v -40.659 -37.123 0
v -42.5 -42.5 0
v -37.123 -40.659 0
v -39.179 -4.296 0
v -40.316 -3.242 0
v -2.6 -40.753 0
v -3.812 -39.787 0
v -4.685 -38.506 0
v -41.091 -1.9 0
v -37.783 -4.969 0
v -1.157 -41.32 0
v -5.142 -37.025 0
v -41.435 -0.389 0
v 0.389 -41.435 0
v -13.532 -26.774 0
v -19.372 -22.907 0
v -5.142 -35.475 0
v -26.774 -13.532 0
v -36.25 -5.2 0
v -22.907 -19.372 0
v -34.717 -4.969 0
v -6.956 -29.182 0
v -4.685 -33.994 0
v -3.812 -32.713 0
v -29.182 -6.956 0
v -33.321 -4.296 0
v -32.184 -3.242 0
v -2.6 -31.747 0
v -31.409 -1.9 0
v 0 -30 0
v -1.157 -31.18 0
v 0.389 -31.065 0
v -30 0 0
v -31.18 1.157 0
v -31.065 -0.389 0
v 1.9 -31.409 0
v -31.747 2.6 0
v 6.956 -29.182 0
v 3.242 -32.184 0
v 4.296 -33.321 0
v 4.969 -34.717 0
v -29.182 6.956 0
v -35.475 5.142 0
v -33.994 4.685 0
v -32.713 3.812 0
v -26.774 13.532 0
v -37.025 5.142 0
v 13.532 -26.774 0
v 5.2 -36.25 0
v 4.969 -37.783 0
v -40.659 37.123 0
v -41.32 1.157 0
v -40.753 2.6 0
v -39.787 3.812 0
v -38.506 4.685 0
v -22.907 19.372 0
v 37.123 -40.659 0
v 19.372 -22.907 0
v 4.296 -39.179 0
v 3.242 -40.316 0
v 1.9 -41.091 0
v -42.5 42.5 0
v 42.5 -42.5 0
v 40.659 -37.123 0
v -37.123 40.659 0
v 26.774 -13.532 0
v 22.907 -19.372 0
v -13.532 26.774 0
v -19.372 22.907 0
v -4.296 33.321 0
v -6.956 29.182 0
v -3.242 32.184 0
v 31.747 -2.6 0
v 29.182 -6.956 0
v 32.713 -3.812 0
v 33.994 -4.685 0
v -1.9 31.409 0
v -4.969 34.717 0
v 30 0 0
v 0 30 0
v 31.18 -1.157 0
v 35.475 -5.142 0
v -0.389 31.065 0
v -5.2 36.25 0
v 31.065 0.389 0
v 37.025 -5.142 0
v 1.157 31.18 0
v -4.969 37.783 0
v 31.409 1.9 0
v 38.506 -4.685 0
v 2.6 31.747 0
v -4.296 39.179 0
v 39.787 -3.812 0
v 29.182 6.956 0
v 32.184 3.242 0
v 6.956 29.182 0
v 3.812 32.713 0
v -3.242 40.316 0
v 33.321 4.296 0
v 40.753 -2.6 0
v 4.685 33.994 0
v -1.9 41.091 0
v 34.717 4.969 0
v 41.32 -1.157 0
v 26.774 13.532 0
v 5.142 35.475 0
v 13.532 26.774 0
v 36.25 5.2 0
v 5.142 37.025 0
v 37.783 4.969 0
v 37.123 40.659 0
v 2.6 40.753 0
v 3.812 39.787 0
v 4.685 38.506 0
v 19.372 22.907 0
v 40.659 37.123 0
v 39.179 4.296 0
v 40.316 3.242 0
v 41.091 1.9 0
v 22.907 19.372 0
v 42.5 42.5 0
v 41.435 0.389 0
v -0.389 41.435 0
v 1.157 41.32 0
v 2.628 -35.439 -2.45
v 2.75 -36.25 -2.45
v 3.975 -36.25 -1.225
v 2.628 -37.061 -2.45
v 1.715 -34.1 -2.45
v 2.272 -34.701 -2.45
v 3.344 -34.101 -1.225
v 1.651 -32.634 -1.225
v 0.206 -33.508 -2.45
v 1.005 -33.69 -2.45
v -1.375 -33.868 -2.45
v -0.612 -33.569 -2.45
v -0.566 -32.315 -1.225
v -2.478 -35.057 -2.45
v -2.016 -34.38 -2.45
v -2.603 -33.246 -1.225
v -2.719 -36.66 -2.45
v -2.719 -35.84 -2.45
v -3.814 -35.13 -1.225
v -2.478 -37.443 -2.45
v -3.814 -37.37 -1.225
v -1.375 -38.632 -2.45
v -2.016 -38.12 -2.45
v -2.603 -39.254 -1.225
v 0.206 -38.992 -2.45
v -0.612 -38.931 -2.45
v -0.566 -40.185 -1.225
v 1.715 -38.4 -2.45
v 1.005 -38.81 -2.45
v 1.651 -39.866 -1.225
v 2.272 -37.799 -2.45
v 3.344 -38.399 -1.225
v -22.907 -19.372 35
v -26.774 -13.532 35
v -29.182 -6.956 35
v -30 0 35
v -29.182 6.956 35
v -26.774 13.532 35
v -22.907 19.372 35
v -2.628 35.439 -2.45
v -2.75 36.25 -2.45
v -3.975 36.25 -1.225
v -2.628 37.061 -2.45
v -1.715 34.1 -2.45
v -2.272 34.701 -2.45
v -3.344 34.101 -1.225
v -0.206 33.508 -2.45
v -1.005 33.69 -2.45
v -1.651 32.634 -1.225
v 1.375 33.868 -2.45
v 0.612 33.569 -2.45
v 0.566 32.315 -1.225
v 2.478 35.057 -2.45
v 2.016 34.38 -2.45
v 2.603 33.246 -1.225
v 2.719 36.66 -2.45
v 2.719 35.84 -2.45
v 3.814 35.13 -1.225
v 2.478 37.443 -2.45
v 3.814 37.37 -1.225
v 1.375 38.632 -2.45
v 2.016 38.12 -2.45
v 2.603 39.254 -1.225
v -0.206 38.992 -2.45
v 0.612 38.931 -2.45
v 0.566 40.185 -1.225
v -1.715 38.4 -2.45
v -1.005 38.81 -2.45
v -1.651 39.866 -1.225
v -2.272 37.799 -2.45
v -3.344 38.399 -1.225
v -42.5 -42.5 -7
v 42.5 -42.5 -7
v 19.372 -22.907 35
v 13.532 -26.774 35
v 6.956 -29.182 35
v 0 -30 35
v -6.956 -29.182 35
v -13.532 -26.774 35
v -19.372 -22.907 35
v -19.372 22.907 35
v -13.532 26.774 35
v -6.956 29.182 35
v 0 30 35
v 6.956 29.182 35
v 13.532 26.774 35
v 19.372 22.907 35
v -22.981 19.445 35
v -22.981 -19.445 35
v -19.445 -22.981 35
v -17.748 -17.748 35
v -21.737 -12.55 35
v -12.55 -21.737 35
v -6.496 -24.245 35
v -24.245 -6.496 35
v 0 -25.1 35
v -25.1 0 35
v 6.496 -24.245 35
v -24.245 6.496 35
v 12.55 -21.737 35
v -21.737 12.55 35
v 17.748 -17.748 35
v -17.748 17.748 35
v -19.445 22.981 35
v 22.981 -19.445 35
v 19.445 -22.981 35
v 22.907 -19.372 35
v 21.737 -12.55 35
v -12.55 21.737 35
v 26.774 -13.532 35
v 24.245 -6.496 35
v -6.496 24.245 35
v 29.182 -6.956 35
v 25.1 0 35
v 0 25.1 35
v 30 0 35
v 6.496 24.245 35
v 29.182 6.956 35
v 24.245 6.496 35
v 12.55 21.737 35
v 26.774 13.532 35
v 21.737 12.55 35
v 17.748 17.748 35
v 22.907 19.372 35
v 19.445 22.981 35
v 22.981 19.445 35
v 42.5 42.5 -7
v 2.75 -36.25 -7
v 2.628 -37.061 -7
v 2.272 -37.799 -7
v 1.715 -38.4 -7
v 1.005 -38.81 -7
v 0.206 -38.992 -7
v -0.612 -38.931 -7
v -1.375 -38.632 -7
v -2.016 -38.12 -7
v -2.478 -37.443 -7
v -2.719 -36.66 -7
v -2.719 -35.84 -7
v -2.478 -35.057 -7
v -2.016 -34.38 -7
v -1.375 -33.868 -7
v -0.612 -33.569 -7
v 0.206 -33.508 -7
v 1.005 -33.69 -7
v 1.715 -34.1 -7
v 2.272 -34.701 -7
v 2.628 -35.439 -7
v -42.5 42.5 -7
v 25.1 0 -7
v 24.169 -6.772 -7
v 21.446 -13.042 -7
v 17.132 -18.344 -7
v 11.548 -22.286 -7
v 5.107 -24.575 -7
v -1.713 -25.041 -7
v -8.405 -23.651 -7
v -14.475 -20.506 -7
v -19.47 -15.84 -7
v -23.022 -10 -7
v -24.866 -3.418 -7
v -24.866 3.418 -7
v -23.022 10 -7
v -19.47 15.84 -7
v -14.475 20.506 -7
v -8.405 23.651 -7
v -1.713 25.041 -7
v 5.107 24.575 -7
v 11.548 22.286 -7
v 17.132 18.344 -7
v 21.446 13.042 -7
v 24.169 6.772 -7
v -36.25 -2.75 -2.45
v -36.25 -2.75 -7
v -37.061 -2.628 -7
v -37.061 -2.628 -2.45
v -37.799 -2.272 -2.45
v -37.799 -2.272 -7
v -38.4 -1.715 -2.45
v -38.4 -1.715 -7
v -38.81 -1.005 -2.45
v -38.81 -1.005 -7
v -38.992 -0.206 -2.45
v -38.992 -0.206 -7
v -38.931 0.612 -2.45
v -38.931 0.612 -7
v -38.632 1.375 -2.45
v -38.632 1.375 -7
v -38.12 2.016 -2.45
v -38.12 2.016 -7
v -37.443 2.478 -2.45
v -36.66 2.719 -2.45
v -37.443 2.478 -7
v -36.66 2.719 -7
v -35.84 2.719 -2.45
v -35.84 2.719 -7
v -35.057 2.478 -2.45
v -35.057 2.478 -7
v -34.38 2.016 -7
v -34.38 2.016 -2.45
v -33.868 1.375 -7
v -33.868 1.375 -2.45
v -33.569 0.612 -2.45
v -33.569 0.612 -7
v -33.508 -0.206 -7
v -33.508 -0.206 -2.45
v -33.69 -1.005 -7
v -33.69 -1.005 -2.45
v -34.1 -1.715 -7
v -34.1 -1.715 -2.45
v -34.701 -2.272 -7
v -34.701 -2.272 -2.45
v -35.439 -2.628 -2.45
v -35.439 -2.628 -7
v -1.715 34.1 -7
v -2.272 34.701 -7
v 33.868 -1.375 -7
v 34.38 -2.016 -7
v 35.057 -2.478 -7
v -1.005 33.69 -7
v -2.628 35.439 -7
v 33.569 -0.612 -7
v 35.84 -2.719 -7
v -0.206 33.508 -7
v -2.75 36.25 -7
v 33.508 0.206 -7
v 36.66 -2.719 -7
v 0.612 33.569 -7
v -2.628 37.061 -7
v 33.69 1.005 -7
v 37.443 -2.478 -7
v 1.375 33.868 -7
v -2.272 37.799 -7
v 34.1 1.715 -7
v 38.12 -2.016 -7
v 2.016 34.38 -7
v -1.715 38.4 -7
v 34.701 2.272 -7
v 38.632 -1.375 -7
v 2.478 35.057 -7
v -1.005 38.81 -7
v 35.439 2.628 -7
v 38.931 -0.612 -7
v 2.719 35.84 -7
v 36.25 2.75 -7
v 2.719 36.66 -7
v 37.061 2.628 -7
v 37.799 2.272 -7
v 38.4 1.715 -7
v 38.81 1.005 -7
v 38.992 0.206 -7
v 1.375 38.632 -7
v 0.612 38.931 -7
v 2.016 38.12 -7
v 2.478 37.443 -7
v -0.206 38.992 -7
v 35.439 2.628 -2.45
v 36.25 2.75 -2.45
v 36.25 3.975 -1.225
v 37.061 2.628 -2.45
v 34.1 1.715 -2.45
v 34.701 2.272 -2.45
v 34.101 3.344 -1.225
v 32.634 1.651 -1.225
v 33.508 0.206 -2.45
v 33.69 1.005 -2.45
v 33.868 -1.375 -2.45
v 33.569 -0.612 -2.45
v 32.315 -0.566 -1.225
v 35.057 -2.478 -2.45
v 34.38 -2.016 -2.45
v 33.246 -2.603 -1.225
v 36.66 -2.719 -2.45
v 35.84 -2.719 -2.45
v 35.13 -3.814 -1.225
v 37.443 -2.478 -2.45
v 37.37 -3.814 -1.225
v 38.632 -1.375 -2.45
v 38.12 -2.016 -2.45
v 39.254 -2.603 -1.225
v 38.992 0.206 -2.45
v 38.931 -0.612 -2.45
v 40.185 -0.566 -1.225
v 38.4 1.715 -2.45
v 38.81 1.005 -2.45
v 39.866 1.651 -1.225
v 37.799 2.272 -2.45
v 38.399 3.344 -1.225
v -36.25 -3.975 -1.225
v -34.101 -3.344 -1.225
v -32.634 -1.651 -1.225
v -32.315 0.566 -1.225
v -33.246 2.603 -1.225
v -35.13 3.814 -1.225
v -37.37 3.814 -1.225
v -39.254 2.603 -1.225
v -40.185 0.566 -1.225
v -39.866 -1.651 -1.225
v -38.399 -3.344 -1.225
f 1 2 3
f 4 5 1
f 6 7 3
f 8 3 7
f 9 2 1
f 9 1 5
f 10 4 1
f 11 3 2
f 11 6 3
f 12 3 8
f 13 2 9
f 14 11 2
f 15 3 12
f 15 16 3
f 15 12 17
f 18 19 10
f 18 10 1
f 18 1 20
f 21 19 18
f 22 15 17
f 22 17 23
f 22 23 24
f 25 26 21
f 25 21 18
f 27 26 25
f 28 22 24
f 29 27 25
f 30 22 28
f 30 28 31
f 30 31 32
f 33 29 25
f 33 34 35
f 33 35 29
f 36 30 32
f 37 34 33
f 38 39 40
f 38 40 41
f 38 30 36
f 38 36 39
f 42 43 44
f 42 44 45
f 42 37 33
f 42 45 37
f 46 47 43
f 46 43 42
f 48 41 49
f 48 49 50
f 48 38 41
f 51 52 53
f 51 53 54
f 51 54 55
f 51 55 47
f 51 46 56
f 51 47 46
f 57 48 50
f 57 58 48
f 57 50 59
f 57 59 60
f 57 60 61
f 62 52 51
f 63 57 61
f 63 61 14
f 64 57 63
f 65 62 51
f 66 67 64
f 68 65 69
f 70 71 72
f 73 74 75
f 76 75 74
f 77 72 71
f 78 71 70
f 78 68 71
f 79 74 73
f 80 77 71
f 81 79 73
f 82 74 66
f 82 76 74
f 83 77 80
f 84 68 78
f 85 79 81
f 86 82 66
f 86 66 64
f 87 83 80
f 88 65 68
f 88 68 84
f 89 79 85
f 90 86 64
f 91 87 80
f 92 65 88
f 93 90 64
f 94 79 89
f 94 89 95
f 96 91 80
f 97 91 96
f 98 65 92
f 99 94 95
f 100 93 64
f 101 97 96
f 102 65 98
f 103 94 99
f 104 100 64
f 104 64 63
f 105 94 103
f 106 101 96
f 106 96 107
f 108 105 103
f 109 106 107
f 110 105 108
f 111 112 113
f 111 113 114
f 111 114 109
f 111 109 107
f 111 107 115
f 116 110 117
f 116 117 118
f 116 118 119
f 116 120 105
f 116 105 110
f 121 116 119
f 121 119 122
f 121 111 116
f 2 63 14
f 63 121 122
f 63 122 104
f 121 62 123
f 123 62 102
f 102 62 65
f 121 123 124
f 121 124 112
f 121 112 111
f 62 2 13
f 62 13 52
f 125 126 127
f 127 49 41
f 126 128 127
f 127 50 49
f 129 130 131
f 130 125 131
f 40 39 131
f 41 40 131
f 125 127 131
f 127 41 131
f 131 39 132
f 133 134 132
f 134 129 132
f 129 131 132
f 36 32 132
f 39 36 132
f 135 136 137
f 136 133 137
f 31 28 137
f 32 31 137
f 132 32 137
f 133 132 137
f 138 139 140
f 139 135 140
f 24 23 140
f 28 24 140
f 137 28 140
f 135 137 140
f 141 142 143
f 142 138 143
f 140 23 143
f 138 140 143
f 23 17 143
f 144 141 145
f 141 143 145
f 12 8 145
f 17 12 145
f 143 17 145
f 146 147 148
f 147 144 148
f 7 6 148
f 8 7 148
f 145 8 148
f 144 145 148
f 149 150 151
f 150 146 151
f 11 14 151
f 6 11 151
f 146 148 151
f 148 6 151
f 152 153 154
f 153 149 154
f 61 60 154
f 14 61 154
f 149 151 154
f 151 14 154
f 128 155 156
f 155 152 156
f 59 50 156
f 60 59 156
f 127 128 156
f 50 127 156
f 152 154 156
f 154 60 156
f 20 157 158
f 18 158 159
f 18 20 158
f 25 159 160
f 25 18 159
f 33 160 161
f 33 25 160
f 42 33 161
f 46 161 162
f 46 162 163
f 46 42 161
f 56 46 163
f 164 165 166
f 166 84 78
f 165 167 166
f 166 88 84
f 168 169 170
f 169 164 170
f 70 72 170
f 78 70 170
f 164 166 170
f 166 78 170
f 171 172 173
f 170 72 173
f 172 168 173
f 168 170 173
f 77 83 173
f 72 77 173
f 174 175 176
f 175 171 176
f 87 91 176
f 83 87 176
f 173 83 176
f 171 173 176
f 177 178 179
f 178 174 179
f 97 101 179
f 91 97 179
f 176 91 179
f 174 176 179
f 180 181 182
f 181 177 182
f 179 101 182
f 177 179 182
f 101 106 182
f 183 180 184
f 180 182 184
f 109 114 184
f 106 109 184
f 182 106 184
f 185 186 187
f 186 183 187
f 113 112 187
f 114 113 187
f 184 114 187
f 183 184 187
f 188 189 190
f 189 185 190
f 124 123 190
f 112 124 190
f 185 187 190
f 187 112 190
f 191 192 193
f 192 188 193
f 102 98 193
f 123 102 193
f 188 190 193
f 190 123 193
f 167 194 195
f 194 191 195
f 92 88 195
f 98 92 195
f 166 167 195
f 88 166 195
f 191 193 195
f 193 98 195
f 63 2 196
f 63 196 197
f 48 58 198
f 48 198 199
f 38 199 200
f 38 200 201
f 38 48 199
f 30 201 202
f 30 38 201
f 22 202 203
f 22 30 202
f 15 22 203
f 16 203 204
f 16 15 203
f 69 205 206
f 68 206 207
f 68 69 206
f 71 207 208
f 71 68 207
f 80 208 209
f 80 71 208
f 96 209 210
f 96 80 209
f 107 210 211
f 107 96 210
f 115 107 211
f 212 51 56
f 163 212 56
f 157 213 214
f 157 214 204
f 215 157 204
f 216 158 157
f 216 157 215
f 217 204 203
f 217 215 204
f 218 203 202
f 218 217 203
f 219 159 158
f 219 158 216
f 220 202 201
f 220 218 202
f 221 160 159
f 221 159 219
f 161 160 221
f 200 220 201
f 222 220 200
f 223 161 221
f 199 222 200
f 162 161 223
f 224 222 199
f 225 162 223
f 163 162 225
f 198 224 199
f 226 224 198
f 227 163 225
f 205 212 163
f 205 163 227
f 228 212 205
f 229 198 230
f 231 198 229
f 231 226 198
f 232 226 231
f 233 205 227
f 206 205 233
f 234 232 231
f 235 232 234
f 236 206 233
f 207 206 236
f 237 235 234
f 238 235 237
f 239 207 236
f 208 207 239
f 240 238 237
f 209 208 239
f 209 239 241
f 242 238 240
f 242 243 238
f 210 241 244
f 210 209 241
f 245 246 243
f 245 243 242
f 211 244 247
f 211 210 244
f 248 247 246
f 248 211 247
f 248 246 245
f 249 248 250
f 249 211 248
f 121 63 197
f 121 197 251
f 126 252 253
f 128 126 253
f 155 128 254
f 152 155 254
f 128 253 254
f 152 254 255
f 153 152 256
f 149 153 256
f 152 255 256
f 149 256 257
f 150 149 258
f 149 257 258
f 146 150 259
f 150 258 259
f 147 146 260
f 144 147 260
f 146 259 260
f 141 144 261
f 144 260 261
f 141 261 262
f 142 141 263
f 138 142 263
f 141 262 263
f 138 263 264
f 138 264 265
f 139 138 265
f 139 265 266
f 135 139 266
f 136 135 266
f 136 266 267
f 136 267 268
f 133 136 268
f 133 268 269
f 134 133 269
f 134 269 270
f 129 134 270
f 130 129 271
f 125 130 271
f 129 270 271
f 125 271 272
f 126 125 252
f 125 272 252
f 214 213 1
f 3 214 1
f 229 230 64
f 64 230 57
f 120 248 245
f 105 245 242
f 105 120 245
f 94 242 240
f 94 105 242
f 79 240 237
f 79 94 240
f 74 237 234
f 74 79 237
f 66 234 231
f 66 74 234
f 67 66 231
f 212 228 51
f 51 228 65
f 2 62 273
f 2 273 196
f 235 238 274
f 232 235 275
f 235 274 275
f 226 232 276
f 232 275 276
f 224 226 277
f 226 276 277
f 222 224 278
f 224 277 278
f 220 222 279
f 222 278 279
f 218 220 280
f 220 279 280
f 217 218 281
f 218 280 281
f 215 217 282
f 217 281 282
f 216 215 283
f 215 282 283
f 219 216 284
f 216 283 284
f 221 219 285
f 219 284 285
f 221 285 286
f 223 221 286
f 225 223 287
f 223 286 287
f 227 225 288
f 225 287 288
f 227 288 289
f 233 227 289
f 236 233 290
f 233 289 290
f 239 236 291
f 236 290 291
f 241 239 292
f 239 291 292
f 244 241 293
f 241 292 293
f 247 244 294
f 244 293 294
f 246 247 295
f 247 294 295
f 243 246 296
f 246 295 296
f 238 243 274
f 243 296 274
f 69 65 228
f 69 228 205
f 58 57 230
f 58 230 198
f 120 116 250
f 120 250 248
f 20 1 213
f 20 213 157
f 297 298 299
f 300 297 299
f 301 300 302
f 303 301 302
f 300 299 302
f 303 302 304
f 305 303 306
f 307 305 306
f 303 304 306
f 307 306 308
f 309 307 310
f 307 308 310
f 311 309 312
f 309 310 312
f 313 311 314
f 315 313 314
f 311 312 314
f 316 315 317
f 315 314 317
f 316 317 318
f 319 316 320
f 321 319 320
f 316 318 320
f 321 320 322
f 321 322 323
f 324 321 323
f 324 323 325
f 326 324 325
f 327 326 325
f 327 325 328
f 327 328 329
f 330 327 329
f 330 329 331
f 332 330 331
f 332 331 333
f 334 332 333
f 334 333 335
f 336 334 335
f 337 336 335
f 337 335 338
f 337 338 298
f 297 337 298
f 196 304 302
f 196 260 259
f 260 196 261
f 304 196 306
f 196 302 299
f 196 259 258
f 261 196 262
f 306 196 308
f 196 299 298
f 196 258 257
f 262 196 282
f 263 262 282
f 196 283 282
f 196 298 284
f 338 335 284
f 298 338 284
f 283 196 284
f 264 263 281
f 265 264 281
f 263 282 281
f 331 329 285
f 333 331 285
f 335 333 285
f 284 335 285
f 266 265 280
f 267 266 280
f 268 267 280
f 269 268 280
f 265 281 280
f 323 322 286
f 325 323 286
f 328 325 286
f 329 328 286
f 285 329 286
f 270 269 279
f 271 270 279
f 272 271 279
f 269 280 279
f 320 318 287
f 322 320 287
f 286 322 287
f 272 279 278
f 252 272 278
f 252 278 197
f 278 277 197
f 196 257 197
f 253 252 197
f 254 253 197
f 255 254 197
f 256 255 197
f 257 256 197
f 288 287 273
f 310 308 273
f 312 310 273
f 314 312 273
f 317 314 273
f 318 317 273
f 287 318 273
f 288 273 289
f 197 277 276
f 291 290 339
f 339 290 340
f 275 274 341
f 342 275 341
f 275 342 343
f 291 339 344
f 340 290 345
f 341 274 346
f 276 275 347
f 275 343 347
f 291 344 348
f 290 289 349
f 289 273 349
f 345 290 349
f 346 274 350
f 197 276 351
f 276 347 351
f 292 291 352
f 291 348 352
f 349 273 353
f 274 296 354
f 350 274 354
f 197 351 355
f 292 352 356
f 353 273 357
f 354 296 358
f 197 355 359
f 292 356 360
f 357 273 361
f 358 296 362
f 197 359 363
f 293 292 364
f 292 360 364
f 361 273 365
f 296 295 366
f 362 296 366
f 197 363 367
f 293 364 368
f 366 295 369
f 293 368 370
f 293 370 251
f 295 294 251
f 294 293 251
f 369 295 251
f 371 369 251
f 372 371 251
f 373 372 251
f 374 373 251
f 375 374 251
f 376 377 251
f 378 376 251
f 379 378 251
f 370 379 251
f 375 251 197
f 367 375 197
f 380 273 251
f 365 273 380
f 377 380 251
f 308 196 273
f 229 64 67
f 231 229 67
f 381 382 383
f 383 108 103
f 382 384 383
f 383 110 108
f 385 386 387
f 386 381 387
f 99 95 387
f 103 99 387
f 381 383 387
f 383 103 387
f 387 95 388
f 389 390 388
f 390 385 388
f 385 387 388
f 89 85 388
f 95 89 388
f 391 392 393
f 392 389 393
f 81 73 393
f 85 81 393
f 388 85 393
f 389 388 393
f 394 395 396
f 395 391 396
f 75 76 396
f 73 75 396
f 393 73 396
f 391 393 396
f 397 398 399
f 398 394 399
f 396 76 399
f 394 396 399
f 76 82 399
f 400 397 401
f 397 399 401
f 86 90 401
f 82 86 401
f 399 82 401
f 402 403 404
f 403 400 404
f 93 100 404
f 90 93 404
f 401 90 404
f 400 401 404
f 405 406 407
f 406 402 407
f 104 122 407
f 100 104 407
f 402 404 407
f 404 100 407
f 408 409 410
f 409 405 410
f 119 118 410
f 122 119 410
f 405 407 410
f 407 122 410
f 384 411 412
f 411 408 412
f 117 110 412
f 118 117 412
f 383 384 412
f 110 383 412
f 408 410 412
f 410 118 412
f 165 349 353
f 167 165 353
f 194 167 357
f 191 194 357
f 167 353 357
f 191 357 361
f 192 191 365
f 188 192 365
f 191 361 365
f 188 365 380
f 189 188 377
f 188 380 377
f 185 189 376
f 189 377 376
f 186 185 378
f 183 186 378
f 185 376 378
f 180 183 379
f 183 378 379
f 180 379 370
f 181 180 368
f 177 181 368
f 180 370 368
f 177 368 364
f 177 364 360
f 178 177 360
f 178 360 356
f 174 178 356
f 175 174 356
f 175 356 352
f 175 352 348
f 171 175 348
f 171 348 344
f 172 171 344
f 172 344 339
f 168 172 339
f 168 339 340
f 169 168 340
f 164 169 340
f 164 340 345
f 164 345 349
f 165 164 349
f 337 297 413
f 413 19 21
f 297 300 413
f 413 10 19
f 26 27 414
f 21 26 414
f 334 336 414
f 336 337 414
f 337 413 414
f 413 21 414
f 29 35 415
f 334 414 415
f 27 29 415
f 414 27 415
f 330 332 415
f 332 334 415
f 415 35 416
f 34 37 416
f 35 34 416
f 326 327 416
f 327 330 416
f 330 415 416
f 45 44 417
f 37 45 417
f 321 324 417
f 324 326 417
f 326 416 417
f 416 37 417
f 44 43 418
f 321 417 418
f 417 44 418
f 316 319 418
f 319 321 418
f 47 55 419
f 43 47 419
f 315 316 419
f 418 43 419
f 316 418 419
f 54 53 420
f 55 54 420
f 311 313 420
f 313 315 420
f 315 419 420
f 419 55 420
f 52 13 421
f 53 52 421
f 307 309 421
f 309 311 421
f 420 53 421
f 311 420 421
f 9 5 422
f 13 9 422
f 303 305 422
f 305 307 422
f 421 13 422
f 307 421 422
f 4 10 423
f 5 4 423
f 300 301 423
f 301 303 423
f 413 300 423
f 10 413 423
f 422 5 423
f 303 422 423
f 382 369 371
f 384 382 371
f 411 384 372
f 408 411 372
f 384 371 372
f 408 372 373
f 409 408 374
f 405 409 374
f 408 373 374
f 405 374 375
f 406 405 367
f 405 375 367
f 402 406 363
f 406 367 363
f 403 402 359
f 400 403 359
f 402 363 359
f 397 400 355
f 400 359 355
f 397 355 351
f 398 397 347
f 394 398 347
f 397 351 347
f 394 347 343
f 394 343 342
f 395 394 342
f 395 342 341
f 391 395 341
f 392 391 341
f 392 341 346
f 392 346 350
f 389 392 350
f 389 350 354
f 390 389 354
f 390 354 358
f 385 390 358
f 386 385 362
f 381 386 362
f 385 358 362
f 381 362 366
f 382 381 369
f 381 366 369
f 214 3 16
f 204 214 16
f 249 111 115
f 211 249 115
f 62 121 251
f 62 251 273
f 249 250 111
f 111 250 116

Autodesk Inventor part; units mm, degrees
ref_plane "YZ Plane" through (0, 0, 0) normal (1, 0, 0) x (0, 1, 0)
ref_plane "XY Plane" through (0, 0, 0) normal (0, 0, 1) x (1, 0, 0)
sketch "Skizze1" plane through (0, 0, 0) normal (0, 0, 1) x (1, 0, 0)
  circle A0 centre (0, 0) radius 25.1
  circle A1 centre (0, 0) radius 30
  line L0 (-42.5, -42.5) -> (42.5, -42.5)
  line L1 (42.5, -42.5) -> (42.5, 42.5)
  line L2 (42.5, 42.5) -> (-42.5, 42.5)
  line L3 (-42.5, 42.5) -> (-42.5, -42.5)
  line L4 (-42.5, -42.5) -> (42.5, 42.5) construction
  line L5 (42.5, -42.5) -> (-42.5, 42.5) construction
  dimension "d0" = 50.2
  dimension "d2" = 60
  dimension "d25" = 85
  dimension "d26" = 85
extrude "Extrusion1" add sketch "Skizze1" against normal blind 7 contours A1 | L3 L2 L1 L0
extrude "Extrusion2" add sketch "Skizze1" along normal blind 35 contours A1
ref_plane "Arbeitsebene1" through (0, 0, 0) normal (-0.7071, 0.7071, 0) x (0, 0, 1)
sketch "Skizze2" plane through (0, 0, 0) normal (-0.7071, 0.7071, 0) x (-0.7071, -0.7071, 0)
  line L0 (25.1, 35) -> (30, 35) projected
  line L1 (30, 35) -> (30, 0) projected
  line L2 (-30, 0) -> (-30, 35) projected
  line L3 (-30, 35) -> (-25.1, 35) projected
  line L4 (-30, 35) -> (-30, 0)
  line L5 (-30, 5) -> (-30, 35)
  line L6 (0, -15.4) -> (0, 43.4) projected
  line L7 (25.1, -7) -> (25.1, 35) projected
  line L8 (-25.1, 35) -> (-25.1, -7) projected
  line L9 (-60.1041, 0) -> (-30, 0) projected
  line L10 (30, 0) -> (60.1041, 0) projected
  line L11 (-60.1041, -7) -> (-60.1041, 0) projected
  line L12 (-25.1, -7) -> (-60.1041, -7) projected
  line L13 (60.1041, 0) -> (60.1041, -7) projected
  line L14 (60.1041, -7) -> (25.1, -7) projected
  line L15 (-30, 35) -> (-55, 0)
  line L16 (-30, 0) -> (-55, 0)
  line L17 (-30, 0) -> (-25.1, 0)
  line L18 (-25.1, 0) -> (-25.1, 35)
  line L19 (-25.1, 35) -> (-30, 35)
  line L20 (-30, 35) -> (-30, 0)
  point P0 (0, 0)
  point P1 (-42.5, -7)
  point P2 (0, 0)
  dimension "d28" = 25
extrude "Extrusion3" add sketch "Skizze2" along normal mid plane 5 contours L9 L15 L2 | L2 L3 L8 L17
pattern_circular "Runde Anordnung1" count 4 over 360 about axis through (0, 0, -10) along (0, 0, 1) of "Extrusion3"
sketch "Skizze3" plane through (0, 0, 0) normal (0, 0, 1) x (1, 0, 0)
  arc A0 (-19.3717, -22.9072) -> (19.3717, -22.9072) centre (0, 0) ccw projected
  arc A1 (-22.9072, 19.3717) -> (-22.9072, -19.3717) centre (0, 0) ccw projected
  arc A2 (22.9072, -19.3717) -> (22.9072, 19.3717) centre (0, 0) ccw projected
  line L0 (-42.5, 42.5) -> (-42.5, -42.5) projected
  circle A3 centre (0, 0) radius 42.5 construction
  circle A4 centre (0, 0) radius 30 construction
  circle A5 centre (0, 0) radius 36.25
  point P0 (-36.25, 0)
  dimension "d31" = 72.5
  dimension "d29" = 60
  dimension "d30" = 85
hole "Bohrung2" at (-36.25, 0, 0) direction (0, 0, -1) diameter 5.5 end through all countersink diameter 10.4 countersink angle 90 clearance for "Flachkopfsenkschraube DIN EN ISO 2009" size "M5" standard "DIN"
pattern_circular "Runde Anordnung3" count 4 over 360 about axis through (0, 0, -10) along (0, 0, 1) of "Bohrung2"
equation "\"d0\" = ht_diameter + 2 * gap_fit"
equation "\"kg_thickness\" = 4.9"
equation "\"ht_thickness\" = 1.9"
equation "\"case_thickness\" = 18"
equation "\"gap_fit\" = 0.1"
equation "\"gap_slide\" = 0.2"
equation "\"gap_air\" = 1"
equation "\"bore_diameter\" = 73"
equation "\"mdf_thickness\" = 6"
equation "\"tape_thickness\" = 3"
equation "\"tape_width\" = 15"
equation "\"inner_thickness\" = 15"
equation "\"inner_depth\" = 255"
equation "\"ht_diameter\" = 50"
properties part number "Zyklon_Flansch"
